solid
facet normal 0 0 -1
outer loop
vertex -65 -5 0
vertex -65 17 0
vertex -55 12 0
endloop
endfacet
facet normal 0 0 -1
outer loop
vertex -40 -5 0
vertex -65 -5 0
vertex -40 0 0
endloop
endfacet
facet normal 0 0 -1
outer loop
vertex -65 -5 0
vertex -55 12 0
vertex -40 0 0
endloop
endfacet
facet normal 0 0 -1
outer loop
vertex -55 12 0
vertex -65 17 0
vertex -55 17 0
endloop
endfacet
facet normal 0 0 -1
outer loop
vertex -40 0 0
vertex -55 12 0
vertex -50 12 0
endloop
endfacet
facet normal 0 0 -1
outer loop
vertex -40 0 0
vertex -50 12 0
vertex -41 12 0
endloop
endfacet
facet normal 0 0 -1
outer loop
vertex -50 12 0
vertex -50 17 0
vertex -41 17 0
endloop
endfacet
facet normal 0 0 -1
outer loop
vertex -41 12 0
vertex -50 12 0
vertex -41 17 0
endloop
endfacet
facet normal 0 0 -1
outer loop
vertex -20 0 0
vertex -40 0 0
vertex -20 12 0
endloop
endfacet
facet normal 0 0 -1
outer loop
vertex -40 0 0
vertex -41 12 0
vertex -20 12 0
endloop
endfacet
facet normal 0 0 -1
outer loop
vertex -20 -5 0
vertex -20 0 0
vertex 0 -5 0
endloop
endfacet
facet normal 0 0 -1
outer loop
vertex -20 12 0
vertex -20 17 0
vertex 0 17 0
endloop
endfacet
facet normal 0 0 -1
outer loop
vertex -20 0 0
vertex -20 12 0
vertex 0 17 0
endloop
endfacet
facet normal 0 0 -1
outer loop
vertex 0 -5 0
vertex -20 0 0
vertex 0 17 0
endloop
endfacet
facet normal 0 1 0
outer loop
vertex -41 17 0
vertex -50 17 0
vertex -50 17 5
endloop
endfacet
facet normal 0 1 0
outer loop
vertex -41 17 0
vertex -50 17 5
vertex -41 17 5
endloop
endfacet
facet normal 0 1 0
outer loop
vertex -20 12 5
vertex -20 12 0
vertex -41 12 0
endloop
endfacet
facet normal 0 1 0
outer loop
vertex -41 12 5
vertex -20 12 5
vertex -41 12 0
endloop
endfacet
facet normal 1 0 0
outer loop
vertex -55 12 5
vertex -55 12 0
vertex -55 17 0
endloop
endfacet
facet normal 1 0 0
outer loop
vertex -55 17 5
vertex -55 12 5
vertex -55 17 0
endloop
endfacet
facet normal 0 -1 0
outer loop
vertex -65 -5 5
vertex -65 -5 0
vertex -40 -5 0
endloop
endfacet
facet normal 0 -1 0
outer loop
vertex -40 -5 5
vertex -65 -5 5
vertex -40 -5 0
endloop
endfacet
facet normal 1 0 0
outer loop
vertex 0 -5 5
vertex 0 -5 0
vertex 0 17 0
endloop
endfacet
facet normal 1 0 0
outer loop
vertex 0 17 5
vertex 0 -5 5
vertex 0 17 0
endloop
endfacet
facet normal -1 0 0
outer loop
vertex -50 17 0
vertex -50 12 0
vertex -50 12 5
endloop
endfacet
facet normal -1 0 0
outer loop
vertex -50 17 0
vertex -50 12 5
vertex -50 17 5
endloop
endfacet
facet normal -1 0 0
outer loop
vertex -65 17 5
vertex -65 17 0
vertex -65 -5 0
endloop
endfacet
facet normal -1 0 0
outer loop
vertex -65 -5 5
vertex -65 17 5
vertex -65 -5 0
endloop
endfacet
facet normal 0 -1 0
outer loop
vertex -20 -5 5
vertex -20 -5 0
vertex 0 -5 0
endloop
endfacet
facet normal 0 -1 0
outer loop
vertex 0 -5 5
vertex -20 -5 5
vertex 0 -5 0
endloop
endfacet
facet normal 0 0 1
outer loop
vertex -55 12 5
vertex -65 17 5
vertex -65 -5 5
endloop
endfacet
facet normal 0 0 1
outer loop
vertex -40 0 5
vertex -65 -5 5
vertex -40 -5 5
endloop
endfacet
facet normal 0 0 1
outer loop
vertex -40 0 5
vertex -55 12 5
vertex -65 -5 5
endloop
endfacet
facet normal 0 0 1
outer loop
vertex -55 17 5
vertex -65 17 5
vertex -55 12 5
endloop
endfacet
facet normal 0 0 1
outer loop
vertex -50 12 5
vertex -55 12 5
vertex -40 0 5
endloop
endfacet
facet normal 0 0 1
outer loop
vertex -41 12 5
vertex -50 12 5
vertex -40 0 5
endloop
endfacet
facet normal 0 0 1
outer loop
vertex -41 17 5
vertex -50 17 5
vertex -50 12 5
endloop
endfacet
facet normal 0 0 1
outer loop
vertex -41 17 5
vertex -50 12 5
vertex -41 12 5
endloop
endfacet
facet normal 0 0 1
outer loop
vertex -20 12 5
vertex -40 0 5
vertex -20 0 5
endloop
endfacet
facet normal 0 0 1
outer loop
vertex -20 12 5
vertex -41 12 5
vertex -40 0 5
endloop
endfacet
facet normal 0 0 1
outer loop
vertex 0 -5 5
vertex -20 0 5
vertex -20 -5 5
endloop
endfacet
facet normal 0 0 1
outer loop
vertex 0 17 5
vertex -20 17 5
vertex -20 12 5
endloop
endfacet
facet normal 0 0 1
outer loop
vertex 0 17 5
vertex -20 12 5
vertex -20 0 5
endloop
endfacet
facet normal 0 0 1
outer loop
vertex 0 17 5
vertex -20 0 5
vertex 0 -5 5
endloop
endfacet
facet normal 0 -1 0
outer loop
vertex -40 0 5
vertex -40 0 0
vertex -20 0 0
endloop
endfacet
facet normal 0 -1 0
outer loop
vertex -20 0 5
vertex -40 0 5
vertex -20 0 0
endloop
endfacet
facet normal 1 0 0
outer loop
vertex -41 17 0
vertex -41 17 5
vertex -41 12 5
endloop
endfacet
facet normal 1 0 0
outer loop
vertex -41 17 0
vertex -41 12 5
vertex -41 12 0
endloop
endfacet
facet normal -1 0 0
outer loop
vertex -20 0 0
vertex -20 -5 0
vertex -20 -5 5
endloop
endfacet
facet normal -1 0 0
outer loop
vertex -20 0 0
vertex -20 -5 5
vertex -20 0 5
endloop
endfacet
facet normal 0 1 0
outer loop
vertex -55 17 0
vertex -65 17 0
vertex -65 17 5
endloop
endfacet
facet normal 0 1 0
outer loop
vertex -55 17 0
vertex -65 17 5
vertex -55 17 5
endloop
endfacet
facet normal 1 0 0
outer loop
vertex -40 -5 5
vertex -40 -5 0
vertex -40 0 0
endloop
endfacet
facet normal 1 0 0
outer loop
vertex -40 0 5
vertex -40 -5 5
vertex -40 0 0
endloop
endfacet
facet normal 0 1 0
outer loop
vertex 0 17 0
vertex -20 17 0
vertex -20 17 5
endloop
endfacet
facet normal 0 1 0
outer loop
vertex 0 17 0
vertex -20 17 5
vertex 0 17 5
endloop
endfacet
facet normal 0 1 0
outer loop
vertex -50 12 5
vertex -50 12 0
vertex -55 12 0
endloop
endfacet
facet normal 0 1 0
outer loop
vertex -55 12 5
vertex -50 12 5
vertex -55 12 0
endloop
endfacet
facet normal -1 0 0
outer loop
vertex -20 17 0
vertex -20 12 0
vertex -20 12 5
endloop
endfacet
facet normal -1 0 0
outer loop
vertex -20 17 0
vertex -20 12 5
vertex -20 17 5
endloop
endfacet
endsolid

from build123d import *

# Parameters (mm, degrees)
SKETCH1_W           = 10
SKETCH1_H           = 5
SKETCH1_W_2         = 25
SKETCH1_W_3         = 20
BOSS_EXTRUDE1_DEPTH = 5
SKETCH2_W           = 5
SKETCH2_H           = 5
CUT_EXTRUDE1_DEPTH  = 1


with BuildPart() as part:
    # Sketch1 → Boss-Extrude1 (new body)
    with BuildSketch(Plane.XY):
        Polygon((-20, 0), (0, 0), (0, 12), (-20, 12), (-40, 12), (-50, 12), (-55, 12), (-65, 12), (-65, 0), (-40, 0), align=None)
        with Locations((-60, 14.5)):
            Rectangle(SKETCH1_W, SKETCH1_H)
        with Locations((-45, 14.5)):
            Rectangle(SKETCH1_W, SKETCH1_H)
        with Locations((-52.5, -2.5)):
            Rectangle(SKETCH1_W_2, SKETCH1_H)
        with Locations((-10, -2.5)):
            Rectangle(SKETCH1_W_3, SKETCH1_H)
        with Locations((-10, 14.5)):
            Rectangle(SKETCH1_W_3, SKETCH1_H)
    extrude(amount=BOSS_EXTRUDE1_DEPTH)

    # Sketch2 → Cut-Extrude1 (cut)
    with BuildSketch(Plane(origin=(-40, 0, 0), x_dir=(0, 0, -1), z_dir=(1, 0, 0))):
        with Locations((-2.5, 14.5)):
            Rectangle(SKETCH2_W, SKETCH2_H)
    extrude(amount=-CUT_EXTRUDE1_DEPTH, mode=Mode.SUBTRACT)


solid = part.part
